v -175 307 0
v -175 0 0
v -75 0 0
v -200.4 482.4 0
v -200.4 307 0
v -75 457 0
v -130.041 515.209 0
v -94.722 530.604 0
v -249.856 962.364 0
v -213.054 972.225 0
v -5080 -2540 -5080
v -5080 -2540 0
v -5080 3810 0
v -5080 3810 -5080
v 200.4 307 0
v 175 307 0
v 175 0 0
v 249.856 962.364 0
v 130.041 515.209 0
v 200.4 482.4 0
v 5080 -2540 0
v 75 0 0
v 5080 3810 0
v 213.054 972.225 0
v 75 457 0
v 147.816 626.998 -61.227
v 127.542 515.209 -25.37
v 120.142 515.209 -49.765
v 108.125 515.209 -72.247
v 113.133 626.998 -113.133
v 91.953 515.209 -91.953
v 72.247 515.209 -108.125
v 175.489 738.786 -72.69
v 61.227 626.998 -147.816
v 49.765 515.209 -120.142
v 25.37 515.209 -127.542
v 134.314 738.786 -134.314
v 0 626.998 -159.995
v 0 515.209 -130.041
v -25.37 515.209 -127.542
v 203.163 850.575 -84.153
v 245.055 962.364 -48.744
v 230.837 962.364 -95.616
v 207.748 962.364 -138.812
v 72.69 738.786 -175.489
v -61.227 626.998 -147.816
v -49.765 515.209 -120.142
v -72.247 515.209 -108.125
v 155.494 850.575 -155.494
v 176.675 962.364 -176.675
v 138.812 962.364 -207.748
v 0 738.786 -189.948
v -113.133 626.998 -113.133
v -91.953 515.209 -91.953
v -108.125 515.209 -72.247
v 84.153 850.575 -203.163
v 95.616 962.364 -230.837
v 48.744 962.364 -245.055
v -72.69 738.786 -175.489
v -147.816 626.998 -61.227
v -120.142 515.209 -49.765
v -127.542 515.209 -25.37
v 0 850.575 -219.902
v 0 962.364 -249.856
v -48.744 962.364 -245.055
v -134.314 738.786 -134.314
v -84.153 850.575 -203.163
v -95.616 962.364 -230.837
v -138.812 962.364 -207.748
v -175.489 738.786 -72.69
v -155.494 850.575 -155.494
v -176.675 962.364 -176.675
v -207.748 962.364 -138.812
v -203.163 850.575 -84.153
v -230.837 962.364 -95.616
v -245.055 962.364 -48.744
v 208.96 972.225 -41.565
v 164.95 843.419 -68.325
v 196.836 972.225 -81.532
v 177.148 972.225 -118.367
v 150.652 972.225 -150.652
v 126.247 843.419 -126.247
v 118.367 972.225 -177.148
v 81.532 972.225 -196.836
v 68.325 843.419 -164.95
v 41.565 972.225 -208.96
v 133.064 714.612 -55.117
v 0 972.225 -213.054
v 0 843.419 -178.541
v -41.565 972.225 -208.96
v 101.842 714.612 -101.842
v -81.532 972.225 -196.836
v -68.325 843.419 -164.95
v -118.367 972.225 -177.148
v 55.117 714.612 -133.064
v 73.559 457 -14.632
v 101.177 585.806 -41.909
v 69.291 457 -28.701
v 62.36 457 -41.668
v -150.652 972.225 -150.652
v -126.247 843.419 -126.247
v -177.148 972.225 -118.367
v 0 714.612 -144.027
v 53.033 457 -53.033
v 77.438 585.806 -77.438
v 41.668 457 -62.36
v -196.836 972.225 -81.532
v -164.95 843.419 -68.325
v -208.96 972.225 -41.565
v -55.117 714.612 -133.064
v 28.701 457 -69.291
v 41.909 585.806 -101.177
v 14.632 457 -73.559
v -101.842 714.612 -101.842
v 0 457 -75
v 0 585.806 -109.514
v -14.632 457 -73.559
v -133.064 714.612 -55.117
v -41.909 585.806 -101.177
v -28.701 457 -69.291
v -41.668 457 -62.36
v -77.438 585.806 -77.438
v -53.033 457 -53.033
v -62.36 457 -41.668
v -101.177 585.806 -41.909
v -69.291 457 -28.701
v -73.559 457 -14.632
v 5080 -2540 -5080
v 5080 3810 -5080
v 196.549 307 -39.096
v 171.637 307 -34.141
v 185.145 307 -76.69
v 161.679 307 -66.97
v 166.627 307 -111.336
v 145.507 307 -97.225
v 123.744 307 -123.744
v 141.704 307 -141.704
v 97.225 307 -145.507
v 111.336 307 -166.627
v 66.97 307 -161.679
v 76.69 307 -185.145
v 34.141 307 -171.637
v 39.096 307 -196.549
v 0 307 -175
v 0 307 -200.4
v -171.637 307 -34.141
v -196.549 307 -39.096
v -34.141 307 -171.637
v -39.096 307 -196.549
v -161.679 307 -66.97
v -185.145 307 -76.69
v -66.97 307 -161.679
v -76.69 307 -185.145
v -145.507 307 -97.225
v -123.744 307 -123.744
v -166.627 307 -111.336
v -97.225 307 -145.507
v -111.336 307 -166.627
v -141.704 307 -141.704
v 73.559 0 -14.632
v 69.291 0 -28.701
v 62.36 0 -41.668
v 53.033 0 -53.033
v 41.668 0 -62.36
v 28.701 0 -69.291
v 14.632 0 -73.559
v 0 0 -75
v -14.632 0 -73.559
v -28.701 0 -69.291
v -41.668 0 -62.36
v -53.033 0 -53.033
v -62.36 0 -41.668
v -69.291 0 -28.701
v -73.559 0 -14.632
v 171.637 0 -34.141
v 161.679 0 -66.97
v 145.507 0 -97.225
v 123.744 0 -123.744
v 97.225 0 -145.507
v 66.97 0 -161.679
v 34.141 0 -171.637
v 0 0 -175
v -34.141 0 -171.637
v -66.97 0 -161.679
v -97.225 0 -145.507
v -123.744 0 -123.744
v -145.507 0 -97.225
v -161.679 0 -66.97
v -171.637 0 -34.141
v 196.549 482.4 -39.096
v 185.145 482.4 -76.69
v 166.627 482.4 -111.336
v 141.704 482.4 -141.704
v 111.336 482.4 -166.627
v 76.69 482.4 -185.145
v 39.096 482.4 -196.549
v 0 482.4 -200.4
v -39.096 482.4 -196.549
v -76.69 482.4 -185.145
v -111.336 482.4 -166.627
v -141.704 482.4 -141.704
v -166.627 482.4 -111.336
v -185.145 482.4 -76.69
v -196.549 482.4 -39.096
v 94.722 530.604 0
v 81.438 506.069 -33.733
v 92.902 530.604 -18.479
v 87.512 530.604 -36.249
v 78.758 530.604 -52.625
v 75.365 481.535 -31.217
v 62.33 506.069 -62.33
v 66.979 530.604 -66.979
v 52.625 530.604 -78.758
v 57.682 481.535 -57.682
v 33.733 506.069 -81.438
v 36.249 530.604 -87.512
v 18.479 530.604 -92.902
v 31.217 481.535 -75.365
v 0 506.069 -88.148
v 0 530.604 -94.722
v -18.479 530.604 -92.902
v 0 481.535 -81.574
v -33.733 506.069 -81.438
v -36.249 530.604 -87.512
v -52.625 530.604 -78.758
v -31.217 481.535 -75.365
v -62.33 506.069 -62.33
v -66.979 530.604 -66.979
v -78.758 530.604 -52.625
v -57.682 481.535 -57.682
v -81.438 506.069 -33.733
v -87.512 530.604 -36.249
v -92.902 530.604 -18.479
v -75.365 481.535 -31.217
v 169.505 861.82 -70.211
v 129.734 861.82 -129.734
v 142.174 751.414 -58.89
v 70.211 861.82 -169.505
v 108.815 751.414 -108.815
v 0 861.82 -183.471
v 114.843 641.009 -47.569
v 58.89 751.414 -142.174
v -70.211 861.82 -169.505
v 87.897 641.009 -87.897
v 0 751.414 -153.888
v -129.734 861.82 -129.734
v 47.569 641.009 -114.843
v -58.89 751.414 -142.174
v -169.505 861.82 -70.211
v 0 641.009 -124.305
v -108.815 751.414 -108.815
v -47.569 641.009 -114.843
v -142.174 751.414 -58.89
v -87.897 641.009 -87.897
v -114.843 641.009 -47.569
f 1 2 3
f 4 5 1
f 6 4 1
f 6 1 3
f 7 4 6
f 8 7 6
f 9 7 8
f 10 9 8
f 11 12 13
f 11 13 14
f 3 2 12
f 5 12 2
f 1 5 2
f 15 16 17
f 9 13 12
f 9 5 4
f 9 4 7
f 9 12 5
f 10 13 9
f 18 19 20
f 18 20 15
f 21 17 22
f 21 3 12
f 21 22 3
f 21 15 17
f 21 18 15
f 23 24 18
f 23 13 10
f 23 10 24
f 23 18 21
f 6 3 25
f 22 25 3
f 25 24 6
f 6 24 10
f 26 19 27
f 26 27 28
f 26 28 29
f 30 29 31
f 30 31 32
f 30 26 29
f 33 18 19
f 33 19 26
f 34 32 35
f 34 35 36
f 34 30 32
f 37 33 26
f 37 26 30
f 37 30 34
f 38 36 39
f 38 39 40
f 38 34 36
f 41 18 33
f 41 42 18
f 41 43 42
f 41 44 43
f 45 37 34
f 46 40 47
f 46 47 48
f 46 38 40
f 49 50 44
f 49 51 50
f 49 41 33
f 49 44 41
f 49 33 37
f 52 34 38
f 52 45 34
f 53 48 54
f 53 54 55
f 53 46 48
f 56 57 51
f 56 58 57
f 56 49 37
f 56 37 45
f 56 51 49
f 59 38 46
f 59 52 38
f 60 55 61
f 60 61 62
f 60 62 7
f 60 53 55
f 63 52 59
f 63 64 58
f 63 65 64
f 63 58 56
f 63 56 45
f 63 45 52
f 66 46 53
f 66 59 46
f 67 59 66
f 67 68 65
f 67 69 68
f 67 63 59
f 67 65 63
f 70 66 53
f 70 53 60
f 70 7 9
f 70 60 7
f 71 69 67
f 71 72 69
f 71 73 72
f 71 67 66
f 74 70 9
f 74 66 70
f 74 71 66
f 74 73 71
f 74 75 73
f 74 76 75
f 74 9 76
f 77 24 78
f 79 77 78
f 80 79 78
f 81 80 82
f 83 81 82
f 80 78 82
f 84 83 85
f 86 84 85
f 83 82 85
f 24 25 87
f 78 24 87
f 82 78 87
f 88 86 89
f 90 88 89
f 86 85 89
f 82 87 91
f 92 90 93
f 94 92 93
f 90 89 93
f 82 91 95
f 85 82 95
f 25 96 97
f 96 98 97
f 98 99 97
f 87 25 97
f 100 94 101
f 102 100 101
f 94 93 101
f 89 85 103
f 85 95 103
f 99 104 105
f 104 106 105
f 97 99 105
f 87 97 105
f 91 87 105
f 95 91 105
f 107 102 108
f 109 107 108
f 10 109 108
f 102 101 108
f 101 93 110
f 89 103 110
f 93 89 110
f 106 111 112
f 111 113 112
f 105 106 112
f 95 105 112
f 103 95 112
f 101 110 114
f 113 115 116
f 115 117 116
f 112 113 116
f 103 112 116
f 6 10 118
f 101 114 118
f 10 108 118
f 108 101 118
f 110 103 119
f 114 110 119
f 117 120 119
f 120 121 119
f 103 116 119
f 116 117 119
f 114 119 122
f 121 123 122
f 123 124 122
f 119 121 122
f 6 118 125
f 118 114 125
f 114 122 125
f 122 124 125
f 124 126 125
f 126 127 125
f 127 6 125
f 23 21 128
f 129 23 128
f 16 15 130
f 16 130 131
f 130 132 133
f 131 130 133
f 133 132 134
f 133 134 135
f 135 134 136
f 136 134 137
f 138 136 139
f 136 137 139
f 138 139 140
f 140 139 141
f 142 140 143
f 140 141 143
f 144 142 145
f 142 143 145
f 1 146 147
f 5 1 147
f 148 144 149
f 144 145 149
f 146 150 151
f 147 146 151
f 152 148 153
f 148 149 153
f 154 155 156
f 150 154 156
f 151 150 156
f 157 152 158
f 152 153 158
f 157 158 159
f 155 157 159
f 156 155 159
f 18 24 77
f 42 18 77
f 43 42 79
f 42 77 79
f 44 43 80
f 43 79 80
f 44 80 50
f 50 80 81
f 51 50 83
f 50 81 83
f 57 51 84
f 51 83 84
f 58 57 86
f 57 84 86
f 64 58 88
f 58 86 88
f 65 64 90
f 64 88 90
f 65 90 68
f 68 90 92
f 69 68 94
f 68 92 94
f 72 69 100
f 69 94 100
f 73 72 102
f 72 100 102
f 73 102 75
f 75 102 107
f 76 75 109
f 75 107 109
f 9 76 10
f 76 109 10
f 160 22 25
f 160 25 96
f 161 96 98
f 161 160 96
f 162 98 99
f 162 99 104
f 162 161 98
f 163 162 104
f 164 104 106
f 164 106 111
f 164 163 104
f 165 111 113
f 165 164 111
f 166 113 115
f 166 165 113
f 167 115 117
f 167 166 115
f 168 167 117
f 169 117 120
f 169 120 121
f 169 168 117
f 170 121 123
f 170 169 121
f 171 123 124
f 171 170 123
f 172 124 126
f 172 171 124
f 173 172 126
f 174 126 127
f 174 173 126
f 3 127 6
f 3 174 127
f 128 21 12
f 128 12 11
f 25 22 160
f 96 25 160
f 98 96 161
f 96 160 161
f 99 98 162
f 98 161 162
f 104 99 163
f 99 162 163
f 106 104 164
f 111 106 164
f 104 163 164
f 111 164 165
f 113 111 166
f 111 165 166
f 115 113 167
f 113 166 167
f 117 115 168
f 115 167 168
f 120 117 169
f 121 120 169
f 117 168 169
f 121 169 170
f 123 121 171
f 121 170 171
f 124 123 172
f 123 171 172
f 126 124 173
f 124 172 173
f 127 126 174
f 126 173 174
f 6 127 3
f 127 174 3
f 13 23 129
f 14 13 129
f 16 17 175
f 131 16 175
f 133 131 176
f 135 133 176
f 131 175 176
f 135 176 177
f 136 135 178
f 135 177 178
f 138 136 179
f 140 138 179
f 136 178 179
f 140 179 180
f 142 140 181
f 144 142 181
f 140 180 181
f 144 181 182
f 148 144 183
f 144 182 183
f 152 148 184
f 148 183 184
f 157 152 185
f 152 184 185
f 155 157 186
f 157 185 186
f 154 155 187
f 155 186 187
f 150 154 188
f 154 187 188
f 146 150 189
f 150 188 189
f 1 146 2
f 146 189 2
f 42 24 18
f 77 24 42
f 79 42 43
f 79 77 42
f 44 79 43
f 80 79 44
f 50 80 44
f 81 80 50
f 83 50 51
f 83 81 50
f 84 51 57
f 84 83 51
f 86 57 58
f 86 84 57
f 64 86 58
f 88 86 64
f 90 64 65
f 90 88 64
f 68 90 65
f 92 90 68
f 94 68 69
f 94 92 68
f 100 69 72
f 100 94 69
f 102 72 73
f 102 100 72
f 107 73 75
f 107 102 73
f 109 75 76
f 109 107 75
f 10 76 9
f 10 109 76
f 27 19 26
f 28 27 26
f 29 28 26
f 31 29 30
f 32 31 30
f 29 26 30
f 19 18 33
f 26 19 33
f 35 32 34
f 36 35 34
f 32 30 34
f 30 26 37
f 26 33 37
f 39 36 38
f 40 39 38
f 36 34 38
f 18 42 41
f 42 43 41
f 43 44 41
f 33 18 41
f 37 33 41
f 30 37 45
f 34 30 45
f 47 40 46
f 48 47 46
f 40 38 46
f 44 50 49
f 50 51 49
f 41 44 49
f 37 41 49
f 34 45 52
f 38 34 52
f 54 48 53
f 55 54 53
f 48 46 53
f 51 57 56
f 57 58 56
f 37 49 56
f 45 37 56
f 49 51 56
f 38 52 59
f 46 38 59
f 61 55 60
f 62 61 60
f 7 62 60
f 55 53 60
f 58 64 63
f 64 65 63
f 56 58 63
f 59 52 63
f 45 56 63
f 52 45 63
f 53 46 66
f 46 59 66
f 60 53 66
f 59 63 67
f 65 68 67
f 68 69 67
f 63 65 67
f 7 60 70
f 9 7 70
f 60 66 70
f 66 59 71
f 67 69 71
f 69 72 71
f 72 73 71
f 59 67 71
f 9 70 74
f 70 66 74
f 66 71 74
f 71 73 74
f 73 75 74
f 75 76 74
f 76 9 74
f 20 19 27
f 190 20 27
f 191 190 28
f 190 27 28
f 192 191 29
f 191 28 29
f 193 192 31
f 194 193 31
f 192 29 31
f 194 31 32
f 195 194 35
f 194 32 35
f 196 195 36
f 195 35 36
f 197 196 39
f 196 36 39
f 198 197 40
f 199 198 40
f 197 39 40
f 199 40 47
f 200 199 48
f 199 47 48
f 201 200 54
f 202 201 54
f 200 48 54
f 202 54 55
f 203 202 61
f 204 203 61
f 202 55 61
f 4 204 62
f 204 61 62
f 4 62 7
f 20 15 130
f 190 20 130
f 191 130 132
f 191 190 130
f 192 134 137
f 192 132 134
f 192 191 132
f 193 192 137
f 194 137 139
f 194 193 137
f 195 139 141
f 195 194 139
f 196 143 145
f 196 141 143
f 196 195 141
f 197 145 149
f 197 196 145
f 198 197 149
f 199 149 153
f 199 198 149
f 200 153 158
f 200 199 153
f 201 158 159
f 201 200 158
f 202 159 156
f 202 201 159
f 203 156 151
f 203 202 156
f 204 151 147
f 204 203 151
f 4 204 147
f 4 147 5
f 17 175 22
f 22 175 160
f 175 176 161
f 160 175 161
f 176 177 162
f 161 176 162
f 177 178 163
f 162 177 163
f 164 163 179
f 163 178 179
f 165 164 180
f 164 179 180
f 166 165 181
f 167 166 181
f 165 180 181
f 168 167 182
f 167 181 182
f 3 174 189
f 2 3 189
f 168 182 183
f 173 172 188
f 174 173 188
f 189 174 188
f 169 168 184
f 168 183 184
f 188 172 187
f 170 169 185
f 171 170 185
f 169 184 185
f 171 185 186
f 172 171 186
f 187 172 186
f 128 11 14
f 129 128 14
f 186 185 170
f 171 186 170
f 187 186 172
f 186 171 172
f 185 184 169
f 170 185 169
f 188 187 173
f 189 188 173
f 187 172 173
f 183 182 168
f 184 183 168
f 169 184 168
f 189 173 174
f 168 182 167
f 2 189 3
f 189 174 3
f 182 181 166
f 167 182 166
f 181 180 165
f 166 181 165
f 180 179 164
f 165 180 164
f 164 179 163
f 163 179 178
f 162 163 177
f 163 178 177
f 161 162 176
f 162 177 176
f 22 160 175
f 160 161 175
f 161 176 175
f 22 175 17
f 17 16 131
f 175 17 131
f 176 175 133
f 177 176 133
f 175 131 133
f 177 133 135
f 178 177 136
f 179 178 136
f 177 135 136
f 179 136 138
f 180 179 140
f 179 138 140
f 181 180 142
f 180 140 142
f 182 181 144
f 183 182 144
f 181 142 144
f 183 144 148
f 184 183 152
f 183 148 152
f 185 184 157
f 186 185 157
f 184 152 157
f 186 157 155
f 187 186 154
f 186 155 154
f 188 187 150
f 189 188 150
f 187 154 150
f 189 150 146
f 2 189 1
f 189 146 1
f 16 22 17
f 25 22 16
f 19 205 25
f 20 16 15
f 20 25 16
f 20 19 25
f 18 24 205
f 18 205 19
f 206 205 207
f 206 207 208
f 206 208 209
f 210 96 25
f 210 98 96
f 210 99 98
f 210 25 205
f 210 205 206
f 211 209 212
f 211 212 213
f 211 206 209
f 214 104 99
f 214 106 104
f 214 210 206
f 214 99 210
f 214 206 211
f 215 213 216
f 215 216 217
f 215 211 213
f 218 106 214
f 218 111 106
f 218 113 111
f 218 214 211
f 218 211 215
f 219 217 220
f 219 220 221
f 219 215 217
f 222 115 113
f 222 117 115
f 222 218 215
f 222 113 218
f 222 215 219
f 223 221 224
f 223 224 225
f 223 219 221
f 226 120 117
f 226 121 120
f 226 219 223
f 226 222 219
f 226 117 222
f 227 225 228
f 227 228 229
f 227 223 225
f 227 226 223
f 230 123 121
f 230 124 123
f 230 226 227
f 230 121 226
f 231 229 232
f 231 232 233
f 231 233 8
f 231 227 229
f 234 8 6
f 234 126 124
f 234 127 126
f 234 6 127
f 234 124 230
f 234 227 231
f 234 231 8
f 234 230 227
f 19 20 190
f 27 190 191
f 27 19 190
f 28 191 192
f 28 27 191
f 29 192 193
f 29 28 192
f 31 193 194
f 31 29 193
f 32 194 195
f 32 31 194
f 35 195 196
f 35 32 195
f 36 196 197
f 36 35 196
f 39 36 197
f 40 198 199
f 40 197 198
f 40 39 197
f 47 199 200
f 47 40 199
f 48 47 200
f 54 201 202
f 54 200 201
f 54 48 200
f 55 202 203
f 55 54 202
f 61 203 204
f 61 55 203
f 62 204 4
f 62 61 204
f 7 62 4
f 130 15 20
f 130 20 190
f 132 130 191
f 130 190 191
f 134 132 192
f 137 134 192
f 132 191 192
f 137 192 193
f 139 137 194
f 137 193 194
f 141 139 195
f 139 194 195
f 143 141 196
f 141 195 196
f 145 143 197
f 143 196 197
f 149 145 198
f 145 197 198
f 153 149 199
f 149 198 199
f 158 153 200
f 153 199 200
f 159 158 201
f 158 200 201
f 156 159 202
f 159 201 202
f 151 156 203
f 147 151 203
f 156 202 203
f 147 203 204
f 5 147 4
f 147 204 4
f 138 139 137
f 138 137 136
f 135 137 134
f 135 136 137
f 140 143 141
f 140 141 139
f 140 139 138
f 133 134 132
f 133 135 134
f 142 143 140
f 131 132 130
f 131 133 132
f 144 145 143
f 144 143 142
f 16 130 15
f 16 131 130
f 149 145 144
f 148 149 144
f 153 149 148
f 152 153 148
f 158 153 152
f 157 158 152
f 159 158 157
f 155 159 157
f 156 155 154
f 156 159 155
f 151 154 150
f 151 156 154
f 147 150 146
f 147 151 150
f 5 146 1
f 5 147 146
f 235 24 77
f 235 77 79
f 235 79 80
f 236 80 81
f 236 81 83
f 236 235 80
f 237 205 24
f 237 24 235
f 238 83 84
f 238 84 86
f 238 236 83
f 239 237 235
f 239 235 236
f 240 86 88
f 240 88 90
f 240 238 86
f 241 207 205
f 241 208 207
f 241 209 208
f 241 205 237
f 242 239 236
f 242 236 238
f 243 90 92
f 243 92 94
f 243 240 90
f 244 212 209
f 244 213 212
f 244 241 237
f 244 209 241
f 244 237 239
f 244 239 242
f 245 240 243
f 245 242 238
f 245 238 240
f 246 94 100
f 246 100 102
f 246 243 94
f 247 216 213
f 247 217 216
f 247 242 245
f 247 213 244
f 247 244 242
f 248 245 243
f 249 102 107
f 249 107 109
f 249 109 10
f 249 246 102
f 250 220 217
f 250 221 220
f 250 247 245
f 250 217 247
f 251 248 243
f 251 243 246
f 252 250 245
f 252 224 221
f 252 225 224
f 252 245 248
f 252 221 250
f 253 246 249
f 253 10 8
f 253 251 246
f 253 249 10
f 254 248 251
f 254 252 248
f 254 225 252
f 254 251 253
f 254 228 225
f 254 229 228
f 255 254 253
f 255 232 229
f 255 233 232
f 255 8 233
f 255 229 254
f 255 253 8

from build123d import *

# Parameters (mm, degrees)
SKETCH1_R           = 175
SKETCH1_R_2         = 75
BOSS_EXTRUDE1_DEPTH = 457
SKETCH3_W           = 10160
SKETCH3_H           = 6350
BOSS_EXTRUDE2_DEPTH = 5080
SKETCH4_W           = 13475.768327993
SKETCH4_H           = 8367.586519284
CUT_EXTRUDE1_DEPTH  = 8132.96778154


# Read off the part's stored shape, not the designer's step: Intersect1
with BuildPart() as part:
    # Sketch1 → Boss-Extrude1 (new body)
    with BuildSketch(Plane(origin=(0, 0, 0), x_dir=(1, 0, 0), z_dir=(0, 1, 0))):
        with Locations(Location((0, 0, 0), (0, 0, 270))):
            Circle(SKETCH1_R)
        with Locations(Location((0, 0, 0), (0, 0, 270))):
            Circle(SKETCH1_R_2, mode=Mode.SUBTRACT)
    extrude(amount=BOSS_EXTRUDE1_DEPTH)

    # Sketch2 → Revolve1 (revolve)
    with BuildSketch(Plane.XY, mode=Mode.PRIVATE) as revolve1_sk:
        Polygon((-175, 307), (-200.4, 307), (-200.4, 482.4), (-130.041054294, 515.208915202), (-249.855852639, 962.363830124), (-213.054078658, 972.224835743), (-94.722011237, 530.603547963), (-75, 457), (-175, 457), align=None)
    revolve(revolve1_sk.sketch.rotate(Axis((0, 0, 0), (0, 1, 0)), 270), axis=Axis((0, 0, 0), (0, 1, 0)))


with BuildPart() as body_2:
    # Sketch3 → Boss-Extrude2 (new, symmetric)
    with BuildSketch(Plane(origin=(0, 0, 0), x_dir=(0, 0, -1), z_dir=(1, 0, 0))):
        with Locations((0, 635)):
            Rectangle(SKETCH3_W, SKETCH3_H)
    extrude(amount=BOSS_EXTRUDE2_DEPTH, both=True)

    # Intersect1 outline → Intersect1 (revolve, cut)
    with BuildSketch(Plane.XY):
        Polygon((75, 457), (75, 0), (175, 0), (175, 307), (200.4, 307), (200.4, 482.4), (130.041054294, 515.208915202), (249.855852639, 962.363830124), (213.054078658, 972.224835743), align=None)
    revolve(axis=Axis((0, 0, 0), (0, 1, 0)), mode=Mode.SUBTRACT)


with BuildPart() as cut_extrude1_tool:
    # Sketch4 → Cut-Extrude1 (new, through all)
    with BuildSketch(Plane.XY):
        with Locations((454.179344916, 464.014834855)):
            Rectangle(SKETCH4_W, SKETCH4_H)
    extrude(amount=CUT_EXTRUDE1_DEPTH)


with BuildPart() as part_1:
    add(part.part)

    # Cut-Extrude1: cut by cut_extrude1_tool
    add(cut_extrude1_tool.part, mode=Mode.SUBTRACT)


with BuildPart() as body_2_1:
    add(body_2.part)

    # Cut-Extrude1: cut by cut_extrude1_tool
    add(cut_extrude1_tool.part, mode=Mode.SUBTRACT)


solid = Compound([part_1.part, body_2_1.part])
